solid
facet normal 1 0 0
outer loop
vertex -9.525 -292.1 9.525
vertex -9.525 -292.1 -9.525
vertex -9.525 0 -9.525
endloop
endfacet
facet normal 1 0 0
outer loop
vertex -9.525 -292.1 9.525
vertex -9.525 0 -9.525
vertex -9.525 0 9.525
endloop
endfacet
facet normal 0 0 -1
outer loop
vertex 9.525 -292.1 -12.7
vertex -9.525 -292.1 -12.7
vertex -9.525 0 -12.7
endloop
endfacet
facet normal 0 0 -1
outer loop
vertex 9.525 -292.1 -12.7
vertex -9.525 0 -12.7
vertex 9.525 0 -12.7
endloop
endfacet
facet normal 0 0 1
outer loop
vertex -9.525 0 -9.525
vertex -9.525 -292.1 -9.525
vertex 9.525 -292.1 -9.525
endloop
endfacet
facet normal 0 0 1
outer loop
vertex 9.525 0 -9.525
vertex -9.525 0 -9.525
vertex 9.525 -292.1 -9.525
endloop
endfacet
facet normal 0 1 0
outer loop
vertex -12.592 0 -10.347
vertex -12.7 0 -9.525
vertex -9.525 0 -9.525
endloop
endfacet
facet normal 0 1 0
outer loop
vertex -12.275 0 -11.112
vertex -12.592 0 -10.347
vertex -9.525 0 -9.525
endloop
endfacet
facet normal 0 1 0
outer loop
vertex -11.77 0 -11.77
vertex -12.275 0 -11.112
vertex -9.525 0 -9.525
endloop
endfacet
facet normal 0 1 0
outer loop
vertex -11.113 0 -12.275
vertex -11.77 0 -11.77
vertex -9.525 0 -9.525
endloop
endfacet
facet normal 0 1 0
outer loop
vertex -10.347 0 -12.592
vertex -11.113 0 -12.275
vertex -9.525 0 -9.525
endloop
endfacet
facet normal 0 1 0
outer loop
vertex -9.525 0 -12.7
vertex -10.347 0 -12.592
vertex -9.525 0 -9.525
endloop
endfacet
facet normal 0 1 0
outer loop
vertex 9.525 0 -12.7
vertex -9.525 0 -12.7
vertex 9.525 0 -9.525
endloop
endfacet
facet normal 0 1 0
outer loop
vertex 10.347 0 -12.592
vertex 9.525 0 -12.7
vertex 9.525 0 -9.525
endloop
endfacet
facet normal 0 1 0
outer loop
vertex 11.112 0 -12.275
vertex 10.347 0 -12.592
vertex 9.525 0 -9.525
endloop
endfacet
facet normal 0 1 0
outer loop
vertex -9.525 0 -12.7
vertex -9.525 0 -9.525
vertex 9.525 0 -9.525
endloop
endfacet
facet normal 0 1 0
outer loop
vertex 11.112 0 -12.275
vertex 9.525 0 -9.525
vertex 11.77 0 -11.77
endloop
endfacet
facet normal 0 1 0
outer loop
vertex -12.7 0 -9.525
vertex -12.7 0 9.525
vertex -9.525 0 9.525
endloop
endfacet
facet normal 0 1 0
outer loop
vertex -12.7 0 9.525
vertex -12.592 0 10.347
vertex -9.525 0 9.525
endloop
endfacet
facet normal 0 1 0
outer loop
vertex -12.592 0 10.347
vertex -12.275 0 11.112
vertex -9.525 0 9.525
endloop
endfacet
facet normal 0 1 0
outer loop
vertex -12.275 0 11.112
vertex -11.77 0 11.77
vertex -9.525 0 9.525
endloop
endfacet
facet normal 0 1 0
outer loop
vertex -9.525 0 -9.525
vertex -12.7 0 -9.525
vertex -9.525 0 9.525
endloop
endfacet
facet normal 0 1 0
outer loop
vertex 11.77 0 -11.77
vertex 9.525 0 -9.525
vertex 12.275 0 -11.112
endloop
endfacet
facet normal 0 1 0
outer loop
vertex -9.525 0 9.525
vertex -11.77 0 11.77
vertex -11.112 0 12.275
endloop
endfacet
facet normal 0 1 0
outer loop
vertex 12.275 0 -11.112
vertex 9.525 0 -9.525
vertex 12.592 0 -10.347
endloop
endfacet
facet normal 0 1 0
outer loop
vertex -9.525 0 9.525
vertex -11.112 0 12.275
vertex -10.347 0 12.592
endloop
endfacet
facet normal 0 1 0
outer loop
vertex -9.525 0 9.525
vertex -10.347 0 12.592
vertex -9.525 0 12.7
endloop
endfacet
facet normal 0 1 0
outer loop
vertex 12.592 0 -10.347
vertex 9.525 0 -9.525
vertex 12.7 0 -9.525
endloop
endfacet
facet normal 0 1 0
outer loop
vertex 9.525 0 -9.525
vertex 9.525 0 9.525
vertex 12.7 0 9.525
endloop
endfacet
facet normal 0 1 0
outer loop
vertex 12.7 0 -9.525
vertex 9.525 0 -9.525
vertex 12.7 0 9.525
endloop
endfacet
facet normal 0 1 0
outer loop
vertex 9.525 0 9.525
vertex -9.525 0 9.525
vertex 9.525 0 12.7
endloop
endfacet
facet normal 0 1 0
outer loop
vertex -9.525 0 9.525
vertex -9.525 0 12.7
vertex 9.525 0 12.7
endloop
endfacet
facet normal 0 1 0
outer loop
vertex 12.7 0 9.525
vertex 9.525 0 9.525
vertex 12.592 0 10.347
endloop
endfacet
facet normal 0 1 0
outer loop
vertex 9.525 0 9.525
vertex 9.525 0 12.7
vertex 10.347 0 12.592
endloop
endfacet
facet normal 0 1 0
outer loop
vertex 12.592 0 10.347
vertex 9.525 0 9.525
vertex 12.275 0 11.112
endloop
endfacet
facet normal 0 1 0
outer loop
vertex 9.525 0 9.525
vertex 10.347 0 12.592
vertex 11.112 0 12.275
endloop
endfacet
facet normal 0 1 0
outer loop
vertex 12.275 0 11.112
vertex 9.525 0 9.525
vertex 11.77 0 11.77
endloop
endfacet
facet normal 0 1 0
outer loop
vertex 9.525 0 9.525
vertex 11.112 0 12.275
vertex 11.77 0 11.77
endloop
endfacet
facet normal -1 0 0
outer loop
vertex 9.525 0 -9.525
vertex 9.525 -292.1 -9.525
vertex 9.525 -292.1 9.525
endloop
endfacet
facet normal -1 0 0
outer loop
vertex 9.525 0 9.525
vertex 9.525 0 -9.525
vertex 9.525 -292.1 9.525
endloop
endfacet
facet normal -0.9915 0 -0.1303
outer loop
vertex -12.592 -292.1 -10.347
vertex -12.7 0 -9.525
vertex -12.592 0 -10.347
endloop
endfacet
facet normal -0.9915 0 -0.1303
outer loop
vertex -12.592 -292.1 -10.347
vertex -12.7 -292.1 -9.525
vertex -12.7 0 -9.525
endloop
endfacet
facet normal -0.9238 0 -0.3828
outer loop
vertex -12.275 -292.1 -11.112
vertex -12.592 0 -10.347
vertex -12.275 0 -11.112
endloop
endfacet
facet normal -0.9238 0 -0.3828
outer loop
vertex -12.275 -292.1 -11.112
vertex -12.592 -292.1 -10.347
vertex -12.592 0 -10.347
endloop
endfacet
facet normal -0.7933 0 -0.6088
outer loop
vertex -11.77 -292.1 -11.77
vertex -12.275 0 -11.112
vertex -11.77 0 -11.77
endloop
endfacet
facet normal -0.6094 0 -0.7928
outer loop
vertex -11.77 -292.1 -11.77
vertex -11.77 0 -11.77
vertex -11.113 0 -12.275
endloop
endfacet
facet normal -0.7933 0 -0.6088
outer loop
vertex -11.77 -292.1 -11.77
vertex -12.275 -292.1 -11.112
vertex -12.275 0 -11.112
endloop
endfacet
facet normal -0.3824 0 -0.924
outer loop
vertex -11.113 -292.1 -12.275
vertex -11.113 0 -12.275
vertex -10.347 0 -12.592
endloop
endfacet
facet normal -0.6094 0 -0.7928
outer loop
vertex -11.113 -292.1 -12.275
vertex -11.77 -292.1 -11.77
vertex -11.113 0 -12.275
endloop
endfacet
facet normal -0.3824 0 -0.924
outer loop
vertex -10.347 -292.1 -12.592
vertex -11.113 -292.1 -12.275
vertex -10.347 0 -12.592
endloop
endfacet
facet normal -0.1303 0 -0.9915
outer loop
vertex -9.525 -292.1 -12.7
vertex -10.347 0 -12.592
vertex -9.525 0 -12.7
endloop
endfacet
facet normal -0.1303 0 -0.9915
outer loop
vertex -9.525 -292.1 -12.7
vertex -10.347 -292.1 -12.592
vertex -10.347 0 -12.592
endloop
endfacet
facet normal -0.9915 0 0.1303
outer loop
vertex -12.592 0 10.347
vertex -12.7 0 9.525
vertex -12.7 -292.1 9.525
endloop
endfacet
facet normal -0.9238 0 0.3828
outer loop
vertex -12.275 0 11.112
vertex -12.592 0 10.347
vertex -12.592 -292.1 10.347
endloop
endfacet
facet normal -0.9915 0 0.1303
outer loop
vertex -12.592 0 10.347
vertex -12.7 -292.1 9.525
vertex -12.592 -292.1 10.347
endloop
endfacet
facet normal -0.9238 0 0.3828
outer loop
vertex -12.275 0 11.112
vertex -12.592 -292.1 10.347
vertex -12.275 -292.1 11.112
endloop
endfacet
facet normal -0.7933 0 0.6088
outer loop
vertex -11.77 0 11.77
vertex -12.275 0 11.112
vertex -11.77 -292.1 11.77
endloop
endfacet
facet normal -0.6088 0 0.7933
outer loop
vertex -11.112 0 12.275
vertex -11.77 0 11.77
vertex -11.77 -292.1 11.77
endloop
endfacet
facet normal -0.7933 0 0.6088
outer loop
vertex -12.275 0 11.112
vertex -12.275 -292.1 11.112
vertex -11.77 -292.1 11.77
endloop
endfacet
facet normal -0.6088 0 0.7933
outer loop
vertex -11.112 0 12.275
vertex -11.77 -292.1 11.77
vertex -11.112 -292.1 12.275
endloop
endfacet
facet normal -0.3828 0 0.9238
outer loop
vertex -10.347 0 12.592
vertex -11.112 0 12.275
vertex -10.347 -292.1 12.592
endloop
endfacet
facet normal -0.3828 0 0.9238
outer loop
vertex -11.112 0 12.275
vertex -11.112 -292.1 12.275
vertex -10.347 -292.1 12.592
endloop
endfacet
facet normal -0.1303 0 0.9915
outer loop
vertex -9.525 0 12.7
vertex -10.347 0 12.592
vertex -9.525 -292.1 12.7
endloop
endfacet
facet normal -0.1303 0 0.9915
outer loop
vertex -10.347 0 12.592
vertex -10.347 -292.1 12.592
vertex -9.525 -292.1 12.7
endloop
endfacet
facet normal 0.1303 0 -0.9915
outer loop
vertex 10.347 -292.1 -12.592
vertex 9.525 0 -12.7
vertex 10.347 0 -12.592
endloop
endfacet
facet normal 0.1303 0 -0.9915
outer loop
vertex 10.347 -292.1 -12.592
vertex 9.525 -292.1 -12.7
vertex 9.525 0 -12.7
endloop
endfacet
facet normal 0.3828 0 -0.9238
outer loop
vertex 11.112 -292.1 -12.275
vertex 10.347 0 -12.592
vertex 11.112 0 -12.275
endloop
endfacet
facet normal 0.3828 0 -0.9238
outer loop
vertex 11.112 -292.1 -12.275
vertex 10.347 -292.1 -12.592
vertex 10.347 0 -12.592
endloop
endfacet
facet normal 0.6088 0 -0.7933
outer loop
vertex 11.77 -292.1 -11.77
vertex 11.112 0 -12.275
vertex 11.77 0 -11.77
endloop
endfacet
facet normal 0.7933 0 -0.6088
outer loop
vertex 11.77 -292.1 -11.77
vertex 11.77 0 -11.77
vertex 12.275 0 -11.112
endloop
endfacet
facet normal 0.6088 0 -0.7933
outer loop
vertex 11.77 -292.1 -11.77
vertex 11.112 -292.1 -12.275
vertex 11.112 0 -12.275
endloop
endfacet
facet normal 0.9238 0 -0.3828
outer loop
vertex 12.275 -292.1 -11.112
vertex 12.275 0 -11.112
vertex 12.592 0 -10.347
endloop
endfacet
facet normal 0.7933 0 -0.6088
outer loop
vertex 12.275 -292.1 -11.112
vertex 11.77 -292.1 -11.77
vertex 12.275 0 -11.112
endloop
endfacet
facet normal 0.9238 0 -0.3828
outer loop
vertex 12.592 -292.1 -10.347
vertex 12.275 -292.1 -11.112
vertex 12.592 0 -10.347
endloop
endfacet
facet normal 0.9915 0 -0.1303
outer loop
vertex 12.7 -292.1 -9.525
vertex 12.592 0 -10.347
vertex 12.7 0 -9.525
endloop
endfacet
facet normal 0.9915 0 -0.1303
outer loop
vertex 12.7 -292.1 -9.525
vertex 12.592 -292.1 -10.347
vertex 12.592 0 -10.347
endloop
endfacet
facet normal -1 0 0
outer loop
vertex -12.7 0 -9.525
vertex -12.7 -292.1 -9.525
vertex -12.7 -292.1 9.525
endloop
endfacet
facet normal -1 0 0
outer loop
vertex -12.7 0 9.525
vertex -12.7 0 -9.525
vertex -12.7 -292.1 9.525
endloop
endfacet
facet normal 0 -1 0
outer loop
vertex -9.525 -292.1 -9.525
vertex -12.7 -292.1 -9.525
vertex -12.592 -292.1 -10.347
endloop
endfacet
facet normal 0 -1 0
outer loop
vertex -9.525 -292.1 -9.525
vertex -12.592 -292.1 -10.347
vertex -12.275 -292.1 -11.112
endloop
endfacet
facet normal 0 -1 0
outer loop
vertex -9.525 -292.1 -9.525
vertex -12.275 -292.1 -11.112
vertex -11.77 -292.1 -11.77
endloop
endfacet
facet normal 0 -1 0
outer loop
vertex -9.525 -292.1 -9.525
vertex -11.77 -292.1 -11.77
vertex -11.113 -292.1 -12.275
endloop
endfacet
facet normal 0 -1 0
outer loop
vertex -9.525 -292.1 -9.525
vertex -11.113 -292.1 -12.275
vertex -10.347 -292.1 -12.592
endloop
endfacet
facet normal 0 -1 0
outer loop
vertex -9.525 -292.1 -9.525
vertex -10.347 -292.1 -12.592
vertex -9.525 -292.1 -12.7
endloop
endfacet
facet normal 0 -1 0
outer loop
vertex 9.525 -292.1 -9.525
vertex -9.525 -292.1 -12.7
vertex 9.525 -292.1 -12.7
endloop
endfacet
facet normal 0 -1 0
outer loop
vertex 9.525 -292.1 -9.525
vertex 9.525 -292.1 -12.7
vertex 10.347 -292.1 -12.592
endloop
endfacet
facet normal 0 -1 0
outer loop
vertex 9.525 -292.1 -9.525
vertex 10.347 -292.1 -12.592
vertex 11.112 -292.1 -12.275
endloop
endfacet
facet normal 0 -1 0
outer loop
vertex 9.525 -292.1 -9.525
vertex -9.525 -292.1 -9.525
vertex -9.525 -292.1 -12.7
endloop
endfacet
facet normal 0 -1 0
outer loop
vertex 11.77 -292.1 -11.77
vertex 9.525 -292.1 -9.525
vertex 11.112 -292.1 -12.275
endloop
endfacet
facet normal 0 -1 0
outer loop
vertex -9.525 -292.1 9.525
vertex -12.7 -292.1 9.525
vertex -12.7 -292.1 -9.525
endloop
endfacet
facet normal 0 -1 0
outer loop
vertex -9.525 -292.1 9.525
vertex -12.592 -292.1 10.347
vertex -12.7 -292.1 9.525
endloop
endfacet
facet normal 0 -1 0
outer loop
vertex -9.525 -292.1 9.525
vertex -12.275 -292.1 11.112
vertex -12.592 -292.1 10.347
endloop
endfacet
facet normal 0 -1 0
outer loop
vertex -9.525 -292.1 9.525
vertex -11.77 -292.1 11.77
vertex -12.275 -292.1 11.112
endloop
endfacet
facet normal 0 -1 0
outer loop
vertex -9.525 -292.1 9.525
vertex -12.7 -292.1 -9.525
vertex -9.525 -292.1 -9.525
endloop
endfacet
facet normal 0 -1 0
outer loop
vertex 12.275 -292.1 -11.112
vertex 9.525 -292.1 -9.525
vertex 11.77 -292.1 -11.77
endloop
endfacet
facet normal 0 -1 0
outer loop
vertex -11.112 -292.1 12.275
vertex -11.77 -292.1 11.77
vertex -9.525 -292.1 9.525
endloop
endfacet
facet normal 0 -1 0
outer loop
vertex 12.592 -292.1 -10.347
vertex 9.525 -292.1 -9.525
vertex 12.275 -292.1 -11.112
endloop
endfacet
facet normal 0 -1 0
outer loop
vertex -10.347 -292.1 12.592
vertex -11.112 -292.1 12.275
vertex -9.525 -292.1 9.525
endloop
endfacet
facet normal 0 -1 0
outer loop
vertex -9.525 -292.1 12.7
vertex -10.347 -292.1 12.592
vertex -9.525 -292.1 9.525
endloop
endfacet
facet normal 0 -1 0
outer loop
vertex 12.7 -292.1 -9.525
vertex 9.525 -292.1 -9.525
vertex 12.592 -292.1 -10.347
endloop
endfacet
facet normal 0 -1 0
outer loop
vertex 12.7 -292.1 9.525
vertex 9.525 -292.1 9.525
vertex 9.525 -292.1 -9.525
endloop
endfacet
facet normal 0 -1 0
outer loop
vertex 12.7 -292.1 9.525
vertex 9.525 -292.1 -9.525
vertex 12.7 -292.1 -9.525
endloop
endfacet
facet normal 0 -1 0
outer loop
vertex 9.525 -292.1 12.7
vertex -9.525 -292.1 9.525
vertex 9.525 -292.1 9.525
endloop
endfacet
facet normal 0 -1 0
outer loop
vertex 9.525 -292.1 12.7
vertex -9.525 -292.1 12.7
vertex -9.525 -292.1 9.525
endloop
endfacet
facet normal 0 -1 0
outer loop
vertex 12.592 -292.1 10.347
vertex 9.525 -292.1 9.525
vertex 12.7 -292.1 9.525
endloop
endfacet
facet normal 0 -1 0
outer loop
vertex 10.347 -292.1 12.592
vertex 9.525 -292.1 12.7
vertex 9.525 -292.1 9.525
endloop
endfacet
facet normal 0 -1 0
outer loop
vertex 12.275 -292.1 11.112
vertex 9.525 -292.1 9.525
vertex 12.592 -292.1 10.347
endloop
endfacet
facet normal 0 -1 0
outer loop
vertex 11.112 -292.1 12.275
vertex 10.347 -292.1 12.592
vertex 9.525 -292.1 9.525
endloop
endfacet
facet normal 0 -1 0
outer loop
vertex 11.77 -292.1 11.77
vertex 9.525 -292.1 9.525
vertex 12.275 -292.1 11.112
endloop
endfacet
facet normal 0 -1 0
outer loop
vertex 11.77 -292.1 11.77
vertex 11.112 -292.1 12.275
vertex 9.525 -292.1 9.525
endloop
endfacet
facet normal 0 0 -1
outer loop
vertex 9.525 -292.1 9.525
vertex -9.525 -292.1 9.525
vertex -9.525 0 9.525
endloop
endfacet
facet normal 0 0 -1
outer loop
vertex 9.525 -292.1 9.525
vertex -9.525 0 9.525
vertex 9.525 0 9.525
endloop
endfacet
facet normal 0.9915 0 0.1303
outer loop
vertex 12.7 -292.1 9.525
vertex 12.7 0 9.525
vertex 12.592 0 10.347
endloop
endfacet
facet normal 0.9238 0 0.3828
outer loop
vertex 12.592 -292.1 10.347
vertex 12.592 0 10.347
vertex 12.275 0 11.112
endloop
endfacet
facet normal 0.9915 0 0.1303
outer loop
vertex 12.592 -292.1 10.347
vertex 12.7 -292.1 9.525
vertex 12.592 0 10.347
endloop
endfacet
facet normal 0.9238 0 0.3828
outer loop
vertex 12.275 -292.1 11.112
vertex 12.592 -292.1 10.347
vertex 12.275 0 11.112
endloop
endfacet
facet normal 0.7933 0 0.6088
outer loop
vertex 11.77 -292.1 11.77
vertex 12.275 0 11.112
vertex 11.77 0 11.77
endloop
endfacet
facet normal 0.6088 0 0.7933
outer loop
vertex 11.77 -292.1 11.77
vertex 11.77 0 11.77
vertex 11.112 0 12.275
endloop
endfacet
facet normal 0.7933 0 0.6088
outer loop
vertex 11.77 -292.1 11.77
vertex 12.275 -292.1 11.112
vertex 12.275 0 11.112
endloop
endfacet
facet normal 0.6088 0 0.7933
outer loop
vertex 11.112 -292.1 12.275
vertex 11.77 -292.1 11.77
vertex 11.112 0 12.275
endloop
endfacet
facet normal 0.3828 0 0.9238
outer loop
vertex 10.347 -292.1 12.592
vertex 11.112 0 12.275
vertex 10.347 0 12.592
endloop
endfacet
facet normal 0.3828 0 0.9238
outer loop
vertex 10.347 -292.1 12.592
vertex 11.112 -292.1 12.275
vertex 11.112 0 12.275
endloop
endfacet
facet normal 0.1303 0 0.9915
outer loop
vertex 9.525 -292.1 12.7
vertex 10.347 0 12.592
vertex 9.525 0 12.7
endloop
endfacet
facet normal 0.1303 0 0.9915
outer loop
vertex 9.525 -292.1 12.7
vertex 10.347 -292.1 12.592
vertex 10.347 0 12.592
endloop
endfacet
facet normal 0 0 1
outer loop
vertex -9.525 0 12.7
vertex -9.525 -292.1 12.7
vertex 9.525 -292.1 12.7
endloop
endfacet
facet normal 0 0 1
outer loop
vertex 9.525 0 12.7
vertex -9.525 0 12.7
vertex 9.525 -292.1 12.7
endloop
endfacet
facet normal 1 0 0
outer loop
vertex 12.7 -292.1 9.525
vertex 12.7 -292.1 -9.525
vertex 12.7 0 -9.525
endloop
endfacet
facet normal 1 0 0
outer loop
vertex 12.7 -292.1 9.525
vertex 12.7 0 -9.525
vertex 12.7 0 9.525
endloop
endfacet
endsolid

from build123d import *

# Parameters (mm, degrees)
F0_W     = 25.4
F0_H     = 25.4
F1_DEPTH = 292.1
F2_R     = 3.175
F3_T     = 3.175


# Not quite as in the source:
# - a shell that OpenCascade refuses in one call is made with other operations: the cavity is built on its own and cut out


with BuildPart() as f1:
    # F0 (on Front) → F1 (new body)
    with BuildSketch(Plane.XZ):
        Rectangle(F0_W, F0_H)
    extrude(amount=F1_DEPTH)

    # F2
    f2_edges = [f1.edges().sort_by_distance(p)[0] for p in [
        (-12.7, -146.05, 12.7),
        (12.7, -146.05, 12.7),
        (12.7, -146.05, -12.7),
        (-12.7, -146.05, -12.7),
    ]]
    fillet(f2_edges, radius=F2_R)

    # F3: shell of thickness 3.175, made by hand


with BuildPart() as f3_core1:
    # F3_t2: copy of F1
    add(f1.part)

    # the walls: a layer under each face that stays
    f3_faces = [f3_core1.faces().sort_by_distance(p)[0] for p in [
        (0, -146.05, -12.7),
        (-12.7, -146.05, 0),
        (12.7, -146.05, 0),
        (0, -146.05, 12.7),
    ]]
    thicken(f3_faces, amount=-F3_T, mode=Mode.SUBTRACT)


with BuildPart() as f1_1:
    add(f1.part)

    # what is left inside the walls is the cavity
    f3_cavity = [f3_core1.part.solids().sort_by_distance(p)[0] for p in [
        (0, -194.733333, -9.49325),
    ]]
    add(f3_cavity, mode=Mode.SUBTRACT)


solid = f1_1.part
